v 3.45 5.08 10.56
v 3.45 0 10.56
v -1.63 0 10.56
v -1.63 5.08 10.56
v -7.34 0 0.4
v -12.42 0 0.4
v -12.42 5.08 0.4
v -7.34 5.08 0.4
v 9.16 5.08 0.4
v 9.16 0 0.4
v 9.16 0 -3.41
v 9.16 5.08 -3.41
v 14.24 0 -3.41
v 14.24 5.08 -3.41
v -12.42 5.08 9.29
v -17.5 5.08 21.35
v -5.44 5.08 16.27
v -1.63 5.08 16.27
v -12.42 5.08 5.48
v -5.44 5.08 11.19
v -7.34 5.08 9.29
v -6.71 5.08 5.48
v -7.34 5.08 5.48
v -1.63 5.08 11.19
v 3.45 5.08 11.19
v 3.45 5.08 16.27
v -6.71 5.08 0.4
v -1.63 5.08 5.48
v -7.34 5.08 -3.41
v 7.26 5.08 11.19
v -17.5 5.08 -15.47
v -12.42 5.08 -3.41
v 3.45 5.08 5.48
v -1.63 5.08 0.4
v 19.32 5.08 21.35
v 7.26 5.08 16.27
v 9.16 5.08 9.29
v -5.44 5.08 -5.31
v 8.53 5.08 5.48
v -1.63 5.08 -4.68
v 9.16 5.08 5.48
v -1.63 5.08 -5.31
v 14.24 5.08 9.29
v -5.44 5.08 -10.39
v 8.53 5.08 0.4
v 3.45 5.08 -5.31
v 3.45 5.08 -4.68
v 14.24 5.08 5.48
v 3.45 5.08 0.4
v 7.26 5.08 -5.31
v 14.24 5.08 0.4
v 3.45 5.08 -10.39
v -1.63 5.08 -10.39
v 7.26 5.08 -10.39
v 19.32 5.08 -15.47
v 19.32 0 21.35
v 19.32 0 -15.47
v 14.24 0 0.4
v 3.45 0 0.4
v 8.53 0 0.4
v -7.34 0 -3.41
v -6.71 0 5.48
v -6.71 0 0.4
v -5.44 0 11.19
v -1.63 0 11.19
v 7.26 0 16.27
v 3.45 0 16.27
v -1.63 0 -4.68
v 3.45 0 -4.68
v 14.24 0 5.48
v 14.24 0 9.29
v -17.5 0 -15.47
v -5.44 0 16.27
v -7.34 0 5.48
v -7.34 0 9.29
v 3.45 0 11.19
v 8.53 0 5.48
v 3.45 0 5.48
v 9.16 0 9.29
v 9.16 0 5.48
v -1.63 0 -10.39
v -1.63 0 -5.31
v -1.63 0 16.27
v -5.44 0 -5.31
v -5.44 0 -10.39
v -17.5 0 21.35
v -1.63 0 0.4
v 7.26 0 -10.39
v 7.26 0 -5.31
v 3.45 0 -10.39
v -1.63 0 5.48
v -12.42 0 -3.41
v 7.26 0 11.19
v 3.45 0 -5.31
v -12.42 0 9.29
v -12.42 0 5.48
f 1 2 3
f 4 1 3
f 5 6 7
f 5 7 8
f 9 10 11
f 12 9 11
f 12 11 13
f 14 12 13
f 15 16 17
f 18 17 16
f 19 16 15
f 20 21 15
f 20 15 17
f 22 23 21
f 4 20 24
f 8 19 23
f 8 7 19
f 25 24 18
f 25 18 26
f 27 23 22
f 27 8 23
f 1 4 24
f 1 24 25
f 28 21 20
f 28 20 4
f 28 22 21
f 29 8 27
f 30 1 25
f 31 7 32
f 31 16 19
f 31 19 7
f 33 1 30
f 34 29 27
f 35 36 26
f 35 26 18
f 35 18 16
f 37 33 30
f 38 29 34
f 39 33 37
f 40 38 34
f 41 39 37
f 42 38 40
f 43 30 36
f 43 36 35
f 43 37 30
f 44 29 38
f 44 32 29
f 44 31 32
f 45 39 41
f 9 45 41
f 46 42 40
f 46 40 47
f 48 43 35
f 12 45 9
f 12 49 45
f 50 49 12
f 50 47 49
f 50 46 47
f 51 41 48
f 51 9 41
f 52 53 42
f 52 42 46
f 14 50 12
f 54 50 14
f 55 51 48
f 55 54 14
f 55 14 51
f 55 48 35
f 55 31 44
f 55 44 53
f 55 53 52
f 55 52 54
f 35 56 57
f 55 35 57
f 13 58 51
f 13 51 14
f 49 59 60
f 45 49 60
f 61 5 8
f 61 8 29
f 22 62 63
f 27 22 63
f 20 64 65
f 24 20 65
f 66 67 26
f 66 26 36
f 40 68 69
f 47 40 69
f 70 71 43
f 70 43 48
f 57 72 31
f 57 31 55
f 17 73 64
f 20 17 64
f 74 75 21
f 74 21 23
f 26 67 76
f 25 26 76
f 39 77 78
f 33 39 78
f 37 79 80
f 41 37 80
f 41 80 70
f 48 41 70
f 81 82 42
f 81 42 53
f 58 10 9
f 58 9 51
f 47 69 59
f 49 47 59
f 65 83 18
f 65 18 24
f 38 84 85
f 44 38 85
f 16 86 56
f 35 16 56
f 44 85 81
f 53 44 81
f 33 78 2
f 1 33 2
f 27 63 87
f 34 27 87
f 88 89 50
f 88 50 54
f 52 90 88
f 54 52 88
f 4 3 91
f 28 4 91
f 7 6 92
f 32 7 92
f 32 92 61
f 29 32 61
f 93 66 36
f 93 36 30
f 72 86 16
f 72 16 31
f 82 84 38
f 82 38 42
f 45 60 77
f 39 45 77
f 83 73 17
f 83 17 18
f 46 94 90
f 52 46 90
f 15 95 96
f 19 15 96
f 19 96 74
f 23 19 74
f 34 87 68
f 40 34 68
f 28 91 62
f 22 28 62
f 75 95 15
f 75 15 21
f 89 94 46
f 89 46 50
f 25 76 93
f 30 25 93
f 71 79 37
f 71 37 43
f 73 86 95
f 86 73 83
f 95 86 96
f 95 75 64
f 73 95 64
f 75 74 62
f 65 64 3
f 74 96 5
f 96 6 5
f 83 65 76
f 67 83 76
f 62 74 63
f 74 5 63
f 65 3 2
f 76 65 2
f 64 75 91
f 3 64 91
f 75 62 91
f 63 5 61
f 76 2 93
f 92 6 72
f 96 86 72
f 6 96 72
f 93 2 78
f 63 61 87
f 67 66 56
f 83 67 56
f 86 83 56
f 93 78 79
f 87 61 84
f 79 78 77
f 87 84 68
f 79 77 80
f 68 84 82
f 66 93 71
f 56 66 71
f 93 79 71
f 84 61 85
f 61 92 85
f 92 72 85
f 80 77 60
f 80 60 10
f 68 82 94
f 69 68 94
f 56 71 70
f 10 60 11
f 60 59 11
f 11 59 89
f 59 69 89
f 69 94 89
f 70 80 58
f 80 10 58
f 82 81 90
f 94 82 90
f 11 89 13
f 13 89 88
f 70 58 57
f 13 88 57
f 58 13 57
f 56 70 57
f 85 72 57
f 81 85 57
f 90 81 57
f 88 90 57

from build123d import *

# Parameters (mm, degrees)
SKETCH1_W           = 36.81984
SKETCH1_H           = 36.81984
SKETCH1_W_2         = 3.81
SKETCH1_H_2         = 5.08
SKETCH1_W_3         = 5.08
SKETCH1_H_3         = 3.81
BOSS_EXTRUDE1_DEPTH = 5.08


with BuildPart() as part:
    # Sketch1 → Boss-Extrude1 (new body)
    with BuildSketch(Plane(origin=(0, 0, 0), x_dir=(1, 0, 0), z_dir=(0, 1, 0))):
        with Locations((0.909996046, -2.939987224)):
            Rectangle(SKETCH1_W, SKETCH1_H)
        Polygon((0.909996046, 4.680012776), (3.449996046, 4.680012776), (3.449996046, -0.399987224), (8.529996046, -0.399987224), (8.529996046, -2.939987224), (8.529996046, -5.479987224), (3.449996046, -5.479987224), (3.449996046, -10.559987224), (0.909996046, -10.559987224), (-1.630003954, -10.559987224), (-1.630003954, -5.479987224), (-6.710003954, -5.479987224), (-6.710003954, -2.939987224), (-6.710003954, -0.399987224), (-1.630003954, -0.399987224), (-1.630003954, 4.680012776), align=None, mode=Mode.SUBTRACT)
        with Locations((5.354996046, 7.849932776)):
            Rectangle(SKETCH1_W_2, SKETCH1_H_2, mode=Mode.SUBTRACT)
        with Locations((-3.535003954, 7.849932776)):
            Rectangle(SKETCH1_W_2, SKETCH1_H_2, mode=Mode.SUBTRACT)
        with Locations((11.699916046, -7.384987224)):
            Rectangle(SKETCH1_W_3, SKETCH1_H_3, mode=Mode.SUBTRACT)
        with Locations((11.699916046, 1.505012776)):
            Rectangle(SKETCH1_W_3, SKETCH1_H_3, mode=Mode.SUBTRACT)
        with Locations((-3.535003954, -13.729907224)):
            Rectangle(SKETCH1_W_2, SKETCH1_H_2, mode=Mode.SUBTRACT)
        with Locations((5.354996046, -13.729907224)):
            Rectangle(SKETCH1_W_2, SKETCH1_H_2, mode=Mode.SUBTRACT)
        with Locations((-9.879923954, 1.505012776)):
            Rectangle(SKETCH1_W_3, SKETCH1_H_3, mode=Mode.SUBTRACT)
        with Locations((-9.879923954, -7.384987224)):
            Rectangle(SKETCH1_W_3, SKETCH1_H_3, mode=Mode.SUBTRACT)
    extrude(amount=BOSS_EXTRUDE1_DEPTH)


solid = part.part
